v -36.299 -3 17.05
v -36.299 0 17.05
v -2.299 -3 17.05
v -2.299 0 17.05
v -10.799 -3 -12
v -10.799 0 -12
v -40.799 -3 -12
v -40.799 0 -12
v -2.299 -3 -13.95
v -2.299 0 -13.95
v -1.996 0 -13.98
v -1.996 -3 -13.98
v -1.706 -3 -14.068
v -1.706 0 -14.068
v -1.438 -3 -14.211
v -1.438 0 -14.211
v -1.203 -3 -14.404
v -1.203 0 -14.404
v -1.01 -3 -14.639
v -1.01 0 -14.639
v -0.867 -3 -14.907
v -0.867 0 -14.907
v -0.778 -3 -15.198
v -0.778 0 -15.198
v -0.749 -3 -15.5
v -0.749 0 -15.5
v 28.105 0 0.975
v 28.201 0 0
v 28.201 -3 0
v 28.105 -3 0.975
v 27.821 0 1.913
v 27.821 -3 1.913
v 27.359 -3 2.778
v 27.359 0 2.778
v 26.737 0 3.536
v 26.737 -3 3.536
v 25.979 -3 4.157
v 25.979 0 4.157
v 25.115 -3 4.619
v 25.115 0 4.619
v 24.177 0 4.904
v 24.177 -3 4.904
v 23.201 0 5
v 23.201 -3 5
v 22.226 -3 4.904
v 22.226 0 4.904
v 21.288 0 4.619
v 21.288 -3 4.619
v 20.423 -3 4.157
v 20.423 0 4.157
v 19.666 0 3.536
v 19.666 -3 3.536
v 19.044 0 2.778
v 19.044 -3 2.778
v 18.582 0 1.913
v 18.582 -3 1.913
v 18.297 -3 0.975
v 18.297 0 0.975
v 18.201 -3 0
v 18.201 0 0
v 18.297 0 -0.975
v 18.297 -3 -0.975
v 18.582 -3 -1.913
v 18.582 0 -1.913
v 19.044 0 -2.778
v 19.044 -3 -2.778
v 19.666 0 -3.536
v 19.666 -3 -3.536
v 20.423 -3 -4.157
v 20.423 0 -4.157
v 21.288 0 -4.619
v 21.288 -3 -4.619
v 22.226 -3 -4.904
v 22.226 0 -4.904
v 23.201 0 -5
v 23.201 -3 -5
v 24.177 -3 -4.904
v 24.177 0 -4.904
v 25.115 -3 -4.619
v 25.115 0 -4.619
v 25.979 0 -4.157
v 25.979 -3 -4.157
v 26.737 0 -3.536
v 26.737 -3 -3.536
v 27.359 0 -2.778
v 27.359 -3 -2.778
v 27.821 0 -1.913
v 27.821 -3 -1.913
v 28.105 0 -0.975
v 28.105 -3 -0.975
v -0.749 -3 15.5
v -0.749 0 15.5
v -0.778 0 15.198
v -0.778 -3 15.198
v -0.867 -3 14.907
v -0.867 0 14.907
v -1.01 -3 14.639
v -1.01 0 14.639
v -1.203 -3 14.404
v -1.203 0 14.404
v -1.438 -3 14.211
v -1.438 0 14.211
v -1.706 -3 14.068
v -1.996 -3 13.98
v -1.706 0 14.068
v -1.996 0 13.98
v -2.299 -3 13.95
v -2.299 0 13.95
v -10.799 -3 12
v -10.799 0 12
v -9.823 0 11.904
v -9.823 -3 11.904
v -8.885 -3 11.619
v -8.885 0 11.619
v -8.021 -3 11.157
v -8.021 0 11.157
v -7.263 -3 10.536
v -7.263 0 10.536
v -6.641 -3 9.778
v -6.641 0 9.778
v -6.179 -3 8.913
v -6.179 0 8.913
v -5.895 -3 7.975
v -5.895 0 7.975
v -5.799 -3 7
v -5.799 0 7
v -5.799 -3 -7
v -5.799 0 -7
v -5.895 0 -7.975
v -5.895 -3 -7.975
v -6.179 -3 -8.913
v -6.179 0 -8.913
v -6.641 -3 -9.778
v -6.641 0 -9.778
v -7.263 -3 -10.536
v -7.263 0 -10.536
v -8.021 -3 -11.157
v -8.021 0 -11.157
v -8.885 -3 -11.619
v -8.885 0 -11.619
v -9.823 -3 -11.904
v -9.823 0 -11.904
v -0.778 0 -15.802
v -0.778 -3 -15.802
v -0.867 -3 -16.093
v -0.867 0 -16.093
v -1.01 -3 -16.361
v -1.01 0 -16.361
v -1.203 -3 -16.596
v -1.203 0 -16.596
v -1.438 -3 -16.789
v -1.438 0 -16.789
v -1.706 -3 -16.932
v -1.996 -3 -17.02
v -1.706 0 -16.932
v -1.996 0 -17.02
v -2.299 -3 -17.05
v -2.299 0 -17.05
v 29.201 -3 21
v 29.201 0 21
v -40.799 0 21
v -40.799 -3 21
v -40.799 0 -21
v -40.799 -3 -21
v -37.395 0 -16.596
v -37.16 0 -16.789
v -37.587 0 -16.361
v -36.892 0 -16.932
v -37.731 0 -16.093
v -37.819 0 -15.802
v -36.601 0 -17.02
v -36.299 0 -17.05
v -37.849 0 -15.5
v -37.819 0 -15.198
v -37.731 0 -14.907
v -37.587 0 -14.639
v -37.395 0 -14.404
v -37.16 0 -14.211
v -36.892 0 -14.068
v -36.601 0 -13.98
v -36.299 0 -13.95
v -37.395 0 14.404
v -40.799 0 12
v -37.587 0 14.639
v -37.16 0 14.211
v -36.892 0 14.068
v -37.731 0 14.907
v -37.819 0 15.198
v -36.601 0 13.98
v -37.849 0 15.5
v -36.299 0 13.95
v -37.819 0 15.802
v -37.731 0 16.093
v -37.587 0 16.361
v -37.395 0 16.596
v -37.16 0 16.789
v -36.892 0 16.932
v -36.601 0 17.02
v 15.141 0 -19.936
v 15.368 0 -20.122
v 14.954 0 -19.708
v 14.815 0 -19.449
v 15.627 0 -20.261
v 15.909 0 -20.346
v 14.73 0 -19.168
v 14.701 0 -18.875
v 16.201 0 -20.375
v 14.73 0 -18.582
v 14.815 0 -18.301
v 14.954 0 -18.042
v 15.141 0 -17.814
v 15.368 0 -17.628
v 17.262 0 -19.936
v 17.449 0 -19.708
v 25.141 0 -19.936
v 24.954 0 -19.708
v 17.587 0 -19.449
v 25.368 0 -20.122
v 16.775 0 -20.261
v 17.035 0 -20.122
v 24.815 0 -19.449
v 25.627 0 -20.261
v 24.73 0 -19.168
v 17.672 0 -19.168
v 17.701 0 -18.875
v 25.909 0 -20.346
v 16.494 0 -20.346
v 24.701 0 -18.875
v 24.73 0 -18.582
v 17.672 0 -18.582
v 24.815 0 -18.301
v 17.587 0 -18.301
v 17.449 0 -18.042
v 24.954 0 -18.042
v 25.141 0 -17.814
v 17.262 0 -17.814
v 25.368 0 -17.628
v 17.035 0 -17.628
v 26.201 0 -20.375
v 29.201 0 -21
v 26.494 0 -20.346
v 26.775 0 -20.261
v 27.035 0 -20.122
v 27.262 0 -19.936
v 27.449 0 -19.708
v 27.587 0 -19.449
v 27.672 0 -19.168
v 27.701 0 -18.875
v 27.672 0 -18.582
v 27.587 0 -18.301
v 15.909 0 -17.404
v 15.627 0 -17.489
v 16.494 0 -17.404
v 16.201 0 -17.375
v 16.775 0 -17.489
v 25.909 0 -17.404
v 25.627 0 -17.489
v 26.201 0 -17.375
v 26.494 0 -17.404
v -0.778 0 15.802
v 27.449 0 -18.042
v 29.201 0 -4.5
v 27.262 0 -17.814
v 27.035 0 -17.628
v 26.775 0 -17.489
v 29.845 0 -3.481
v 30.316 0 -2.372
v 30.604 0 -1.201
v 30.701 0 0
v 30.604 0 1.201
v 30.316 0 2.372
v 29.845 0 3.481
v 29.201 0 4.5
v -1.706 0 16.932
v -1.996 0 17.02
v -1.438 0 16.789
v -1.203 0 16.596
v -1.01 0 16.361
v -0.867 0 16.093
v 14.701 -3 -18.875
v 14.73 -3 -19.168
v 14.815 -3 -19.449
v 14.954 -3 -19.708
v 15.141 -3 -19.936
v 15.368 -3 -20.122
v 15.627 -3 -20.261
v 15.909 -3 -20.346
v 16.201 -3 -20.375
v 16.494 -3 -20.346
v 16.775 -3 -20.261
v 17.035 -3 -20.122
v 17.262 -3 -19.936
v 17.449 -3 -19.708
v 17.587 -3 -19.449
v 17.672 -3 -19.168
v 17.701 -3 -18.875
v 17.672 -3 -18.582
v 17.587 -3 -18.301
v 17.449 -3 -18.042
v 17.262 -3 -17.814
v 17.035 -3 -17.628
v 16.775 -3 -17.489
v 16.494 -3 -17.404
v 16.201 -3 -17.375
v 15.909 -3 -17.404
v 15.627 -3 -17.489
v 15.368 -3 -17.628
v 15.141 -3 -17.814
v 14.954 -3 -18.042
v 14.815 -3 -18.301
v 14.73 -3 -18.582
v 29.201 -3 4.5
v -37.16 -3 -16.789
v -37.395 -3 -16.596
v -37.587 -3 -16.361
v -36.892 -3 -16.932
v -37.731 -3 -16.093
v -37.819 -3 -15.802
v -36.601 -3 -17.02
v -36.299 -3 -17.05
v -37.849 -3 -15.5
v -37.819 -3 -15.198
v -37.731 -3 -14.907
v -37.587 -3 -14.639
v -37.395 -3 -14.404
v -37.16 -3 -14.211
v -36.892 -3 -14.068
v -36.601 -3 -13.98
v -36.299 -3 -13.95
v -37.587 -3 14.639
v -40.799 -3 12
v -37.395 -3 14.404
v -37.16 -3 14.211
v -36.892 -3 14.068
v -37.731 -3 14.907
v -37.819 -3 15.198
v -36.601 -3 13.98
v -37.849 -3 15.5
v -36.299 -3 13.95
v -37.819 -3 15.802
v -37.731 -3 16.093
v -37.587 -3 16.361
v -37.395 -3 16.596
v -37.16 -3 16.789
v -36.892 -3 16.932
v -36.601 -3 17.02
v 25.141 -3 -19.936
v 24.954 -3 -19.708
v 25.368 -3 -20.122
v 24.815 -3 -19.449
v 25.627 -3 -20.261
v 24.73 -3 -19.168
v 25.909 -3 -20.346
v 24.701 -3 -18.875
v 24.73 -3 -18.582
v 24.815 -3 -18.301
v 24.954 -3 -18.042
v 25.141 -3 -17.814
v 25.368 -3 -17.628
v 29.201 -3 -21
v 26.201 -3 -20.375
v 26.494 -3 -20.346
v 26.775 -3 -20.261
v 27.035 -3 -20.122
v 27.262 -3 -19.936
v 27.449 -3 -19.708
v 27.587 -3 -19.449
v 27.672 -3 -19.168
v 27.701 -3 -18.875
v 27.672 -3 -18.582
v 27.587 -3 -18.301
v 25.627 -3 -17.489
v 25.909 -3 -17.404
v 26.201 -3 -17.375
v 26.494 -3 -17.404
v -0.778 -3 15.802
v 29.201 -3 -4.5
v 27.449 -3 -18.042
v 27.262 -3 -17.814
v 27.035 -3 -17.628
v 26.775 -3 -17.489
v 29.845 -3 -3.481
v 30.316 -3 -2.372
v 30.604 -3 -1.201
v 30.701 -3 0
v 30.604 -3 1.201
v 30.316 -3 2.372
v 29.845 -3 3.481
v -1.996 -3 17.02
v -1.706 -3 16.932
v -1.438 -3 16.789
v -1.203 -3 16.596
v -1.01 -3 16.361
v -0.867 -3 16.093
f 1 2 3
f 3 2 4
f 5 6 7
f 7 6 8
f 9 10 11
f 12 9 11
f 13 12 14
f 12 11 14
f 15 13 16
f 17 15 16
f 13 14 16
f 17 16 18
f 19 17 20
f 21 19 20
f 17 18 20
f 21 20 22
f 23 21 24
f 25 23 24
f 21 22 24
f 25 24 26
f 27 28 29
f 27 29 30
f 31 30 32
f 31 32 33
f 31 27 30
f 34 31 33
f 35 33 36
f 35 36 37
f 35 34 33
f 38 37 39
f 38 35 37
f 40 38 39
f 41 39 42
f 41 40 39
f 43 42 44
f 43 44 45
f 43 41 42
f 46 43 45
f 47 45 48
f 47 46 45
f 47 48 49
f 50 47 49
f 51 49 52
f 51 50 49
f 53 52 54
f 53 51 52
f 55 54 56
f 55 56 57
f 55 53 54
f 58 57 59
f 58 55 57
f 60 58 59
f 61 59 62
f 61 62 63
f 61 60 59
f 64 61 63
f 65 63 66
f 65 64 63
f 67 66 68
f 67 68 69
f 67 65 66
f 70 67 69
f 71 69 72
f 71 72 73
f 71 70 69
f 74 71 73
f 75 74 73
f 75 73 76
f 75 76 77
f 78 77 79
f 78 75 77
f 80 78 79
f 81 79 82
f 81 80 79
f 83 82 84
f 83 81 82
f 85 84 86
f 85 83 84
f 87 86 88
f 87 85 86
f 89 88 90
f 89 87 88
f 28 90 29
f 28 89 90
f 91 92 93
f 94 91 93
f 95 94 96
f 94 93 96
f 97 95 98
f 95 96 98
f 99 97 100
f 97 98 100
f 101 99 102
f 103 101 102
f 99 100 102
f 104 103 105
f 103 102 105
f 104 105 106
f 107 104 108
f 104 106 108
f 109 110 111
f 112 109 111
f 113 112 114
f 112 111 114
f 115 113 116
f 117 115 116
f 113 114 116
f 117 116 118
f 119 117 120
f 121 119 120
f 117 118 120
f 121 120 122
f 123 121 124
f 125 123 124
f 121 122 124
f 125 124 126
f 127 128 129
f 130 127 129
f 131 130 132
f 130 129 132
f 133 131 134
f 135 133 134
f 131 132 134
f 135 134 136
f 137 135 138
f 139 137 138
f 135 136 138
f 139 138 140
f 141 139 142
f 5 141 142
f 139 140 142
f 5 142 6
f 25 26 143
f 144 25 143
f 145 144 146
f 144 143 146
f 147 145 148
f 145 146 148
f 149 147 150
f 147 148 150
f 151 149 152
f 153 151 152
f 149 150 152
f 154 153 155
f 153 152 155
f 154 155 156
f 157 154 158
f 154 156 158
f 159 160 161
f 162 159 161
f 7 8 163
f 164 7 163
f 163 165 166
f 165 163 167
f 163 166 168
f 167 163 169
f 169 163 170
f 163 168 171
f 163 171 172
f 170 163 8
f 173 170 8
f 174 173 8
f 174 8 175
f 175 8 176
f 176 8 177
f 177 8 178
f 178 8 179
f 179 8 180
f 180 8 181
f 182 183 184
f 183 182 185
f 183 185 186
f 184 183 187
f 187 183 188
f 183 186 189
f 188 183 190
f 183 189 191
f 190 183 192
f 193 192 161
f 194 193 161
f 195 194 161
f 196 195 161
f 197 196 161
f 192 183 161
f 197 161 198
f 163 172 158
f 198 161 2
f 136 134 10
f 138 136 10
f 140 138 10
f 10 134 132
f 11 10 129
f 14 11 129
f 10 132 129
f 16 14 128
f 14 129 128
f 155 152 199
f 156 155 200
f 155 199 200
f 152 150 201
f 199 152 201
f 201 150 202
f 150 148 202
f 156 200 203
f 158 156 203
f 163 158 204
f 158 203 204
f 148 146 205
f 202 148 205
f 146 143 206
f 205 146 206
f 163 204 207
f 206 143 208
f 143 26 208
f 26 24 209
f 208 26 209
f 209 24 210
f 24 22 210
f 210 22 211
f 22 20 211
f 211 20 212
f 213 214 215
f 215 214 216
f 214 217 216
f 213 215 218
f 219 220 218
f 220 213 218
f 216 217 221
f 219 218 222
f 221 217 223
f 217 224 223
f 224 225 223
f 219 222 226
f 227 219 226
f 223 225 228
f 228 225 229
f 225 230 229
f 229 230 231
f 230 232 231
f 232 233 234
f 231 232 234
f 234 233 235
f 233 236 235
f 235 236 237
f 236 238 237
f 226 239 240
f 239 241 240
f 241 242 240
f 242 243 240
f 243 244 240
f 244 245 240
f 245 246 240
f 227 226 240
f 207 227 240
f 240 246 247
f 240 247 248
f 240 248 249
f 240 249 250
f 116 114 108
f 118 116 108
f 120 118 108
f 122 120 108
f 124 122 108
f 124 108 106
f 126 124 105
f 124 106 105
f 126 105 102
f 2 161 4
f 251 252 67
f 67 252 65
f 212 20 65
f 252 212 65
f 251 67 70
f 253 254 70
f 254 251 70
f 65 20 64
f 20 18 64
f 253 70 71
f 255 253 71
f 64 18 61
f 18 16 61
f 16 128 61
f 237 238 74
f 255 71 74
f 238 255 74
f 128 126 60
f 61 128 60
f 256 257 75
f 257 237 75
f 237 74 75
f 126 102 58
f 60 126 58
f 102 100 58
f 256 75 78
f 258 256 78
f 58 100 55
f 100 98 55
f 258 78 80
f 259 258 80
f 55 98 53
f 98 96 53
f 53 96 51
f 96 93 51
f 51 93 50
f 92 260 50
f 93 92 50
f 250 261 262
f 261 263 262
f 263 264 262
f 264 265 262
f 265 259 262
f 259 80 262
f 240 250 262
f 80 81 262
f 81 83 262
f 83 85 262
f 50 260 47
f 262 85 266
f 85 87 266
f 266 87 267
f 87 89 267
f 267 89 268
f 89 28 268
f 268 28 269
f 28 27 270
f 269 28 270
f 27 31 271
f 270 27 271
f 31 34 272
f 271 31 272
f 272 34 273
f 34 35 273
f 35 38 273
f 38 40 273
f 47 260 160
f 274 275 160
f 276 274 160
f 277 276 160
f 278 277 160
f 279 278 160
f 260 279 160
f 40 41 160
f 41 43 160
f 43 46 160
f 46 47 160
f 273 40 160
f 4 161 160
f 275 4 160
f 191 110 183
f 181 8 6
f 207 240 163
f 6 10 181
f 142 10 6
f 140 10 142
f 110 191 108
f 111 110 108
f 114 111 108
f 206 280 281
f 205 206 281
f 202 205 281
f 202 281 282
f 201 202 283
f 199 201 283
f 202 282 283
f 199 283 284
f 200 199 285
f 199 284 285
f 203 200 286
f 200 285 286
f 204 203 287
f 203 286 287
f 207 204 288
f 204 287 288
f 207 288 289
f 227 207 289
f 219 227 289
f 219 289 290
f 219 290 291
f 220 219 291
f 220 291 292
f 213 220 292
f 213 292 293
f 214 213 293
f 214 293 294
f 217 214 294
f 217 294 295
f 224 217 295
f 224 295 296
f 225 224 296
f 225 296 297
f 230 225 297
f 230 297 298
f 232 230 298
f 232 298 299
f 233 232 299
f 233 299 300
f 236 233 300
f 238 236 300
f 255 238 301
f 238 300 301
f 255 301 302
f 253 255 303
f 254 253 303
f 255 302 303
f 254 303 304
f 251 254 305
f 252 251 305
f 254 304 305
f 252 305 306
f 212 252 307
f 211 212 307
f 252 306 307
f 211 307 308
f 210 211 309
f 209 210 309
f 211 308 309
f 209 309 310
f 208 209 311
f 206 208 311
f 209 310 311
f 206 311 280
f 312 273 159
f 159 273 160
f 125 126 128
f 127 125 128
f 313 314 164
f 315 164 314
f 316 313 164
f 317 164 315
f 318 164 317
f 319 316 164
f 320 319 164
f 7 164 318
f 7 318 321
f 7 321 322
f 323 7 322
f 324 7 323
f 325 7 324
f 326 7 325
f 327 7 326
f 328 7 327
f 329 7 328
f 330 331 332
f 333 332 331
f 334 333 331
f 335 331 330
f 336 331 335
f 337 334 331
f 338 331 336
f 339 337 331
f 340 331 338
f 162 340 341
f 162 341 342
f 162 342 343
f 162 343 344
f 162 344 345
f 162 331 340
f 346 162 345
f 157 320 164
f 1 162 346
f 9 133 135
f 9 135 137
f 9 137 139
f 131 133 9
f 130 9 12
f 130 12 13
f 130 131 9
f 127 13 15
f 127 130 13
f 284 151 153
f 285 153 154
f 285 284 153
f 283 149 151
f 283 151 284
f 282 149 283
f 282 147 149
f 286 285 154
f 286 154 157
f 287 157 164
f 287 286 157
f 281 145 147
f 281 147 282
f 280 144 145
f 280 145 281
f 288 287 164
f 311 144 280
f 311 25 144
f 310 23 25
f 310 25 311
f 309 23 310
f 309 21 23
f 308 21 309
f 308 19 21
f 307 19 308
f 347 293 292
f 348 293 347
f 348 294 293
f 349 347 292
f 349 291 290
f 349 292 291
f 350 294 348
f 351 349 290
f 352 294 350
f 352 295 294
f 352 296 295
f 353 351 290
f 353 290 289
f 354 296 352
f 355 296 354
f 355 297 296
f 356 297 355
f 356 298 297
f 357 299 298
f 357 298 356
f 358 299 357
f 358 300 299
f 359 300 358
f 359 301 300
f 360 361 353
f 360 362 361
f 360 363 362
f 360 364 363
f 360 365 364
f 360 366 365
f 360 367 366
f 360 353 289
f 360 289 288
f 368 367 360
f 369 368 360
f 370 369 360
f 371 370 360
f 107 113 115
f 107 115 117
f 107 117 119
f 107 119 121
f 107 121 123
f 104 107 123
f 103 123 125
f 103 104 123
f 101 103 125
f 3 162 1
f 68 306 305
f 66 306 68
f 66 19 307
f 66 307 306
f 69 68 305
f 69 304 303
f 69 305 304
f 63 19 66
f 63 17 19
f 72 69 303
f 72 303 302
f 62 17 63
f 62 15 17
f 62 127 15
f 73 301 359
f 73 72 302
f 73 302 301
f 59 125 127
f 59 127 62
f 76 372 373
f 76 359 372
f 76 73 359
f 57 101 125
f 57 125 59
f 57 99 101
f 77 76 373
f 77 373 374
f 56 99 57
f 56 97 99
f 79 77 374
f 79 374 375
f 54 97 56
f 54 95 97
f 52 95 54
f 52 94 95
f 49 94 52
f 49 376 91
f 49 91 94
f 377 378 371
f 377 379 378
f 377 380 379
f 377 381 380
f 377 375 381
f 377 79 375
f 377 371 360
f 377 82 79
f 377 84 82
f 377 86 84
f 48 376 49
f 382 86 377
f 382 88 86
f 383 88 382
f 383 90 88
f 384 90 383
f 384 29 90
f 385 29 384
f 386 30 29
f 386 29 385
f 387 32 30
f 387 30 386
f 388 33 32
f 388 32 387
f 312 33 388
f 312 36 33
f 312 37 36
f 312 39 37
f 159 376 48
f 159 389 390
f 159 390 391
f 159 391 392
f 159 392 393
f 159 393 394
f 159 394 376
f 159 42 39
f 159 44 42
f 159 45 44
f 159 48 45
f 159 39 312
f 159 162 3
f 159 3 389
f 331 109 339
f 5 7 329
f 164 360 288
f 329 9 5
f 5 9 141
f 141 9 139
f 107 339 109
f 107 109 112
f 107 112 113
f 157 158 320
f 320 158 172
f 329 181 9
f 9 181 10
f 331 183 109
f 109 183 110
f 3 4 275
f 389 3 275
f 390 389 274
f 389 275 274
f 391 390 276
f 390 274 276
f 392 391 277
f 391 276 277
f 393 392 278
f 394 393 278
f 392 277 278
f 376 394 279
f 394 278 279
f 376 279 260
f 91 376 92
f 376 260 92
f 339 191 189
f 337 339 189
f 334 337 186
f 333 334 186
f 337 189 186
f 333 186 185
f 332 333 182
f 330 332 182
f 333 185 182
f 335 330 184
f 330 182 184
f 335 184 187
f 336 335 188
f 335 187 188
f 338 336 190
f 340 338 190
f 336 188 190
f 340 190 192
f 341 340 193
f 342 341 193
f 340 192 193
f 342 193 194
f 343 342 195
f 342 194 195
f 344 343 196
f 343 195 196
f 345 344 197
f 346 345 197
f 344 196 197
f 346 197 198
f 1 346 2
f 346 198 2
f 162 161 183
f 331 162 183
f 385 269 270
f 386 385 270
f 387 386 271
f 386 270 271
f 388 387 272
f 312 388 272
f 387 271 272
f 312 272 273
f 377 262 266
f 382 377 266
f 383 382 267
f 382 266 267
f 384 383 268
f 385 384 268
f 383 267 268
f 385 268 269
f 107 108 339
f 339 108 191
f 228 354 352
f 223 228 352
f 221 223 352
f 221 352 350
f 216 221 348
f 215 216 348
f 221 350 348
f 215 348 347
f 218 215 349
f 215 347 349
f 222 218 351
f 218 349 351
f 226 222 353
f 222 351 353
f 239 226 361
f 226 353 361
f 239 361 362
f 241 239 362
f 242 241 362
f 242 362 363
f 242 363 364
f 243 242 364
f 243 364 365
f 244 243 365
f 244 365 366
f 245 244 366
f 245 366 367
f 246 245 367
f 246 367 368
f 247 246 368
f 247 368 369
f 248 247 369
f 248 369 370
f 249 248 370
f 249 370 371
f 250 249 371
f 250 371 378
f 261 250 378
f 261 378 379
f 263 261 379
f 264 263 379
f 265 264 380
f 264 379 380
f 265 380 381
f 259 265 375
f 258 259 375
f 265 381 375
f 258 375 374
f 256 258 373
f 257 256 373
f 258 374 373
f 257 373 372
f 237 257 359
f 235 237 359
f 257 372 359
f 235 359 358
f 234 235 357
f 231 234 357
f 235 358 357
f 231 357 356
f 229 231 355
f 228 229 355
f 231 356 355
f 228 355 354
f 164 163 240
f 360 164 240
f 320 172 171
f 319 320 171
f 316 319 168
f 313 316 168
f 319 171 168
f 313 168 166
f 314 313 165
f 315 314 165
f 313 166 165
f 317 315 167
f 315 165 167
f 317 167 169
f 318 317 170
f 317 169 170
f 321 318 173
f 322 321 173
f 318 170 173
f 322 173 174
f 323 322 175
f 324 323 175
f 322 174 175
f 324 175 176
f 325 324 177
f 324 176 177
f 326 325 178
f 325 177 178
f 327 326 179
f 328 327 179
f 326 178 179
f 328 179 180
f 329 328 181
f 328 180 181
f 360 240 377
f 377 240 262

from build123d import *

# Parameters (mm, degrees)
F0_R     = 5
F1_DEPTH = 3
F2_D     = 3


with BuildPart() as f1:
    # F0 (on Front) → F1 (new body)
    with BuildSketch(Plane.XZ):
        with BuildLine():
            Line((29.2013126835, 21), (-40.7986873165, 21))
            Line((-40.7986873165, 21), (-40.7986873165, 12))
            Line((-40.7986873165, 12), (-10.7986873165, 12))
            ThreePointArc((-10.7986873165, 12), (-7.2631534106, 10.5355339059), (-5.7986873165, 7))
            Line((-5.7986873165, 7), (-5.7986873165, -7))
            ThreePointArc((-5.7986873165, -7), (-7.2631534106, -10.5355339059), (-10.7986873165, -12))
            Line((-10.7986873165, -12), (-40.7986873165, -12))
            Line((-40.7986873165, -12), (-40.7986873165, -21))
            Line((-40.7986873165, -21), (29.2013126835, -21))
            Line((29.2013126835, -21), (29.2013126835, -4.5))
            ThreePointArc((29.2013126835, -4.5), (15.7013126835, 0), (29.2013126835, 4.5))
            Line((29.2013126835, 4.5), (29.2013126835, 21))
        make_face()
        with BuildLine():
            Line((-2.2986873165, -17.05), (-36.2986873165, -17.05))
            ThreePointArc((-36.2986873165, -17.05), (-37.8486873165, -15.5), (-36.2986873165, -13.95))
            Line((-36.2986873165, -13.95), (-2.2986873165, -13.95))
            ThreePointArc((-2.2986873165, -13.95), (-1.2026718057, -14.4039844892), (-0.7486873165, -15.5))
            ThreePointArc((-0.7486873165, -15.5), (-1.2026718057, -16.5960155108), (-2.2986873165, -17.05))
        make_face(mode=Mode.SUBTRACT)
        with BuildLine():
            ThreePointArc((-36.2986873165, 13.95), (-37.8486873165, 15.5), (-36.2986873165, 17.05))
            Line((-36.2986873165, 17.05), (-2.2986873165, 17.05))
            ThreePointArc((-2.2986873165, 17.05), (-1.2026718057, 16.5960155108), (-0.7486873165, 15.5))
            ThreePointArc((-0.7486873165, 15.5), (-1.2026718057, 14.4039844892), (-2.2986873165, 13.95))
            Line((-2.2986873165, 13.95), (-36.2986873165, 13.95))
        make_face(mode=Mode.SUBTRACT)
        with BuildLine():
            ThreePointArc((30.7013126835, 0), (30.3164374189, 2.3717082451), (29.2013126835, 4.5))
            Line((29.2013126835, 4.5), (29.2013126835, -4.5))
            ThreePointArc((29.2013126835, -4.5), (30.3164374189, -2.3717082451), (30.7013126835, 0))
        make_face()
        with BuildLine():
            Line((29.2013126835, -4.5), (29.2013126835, 4.5))
            ThreePointArc((29.2013126835, 4.5), (15.7013126835, 0), (29.2013126835, -4.5))
        make_face()
        with Locations((23.2013126835, 0)):
            Circle(F0_R, mode=Mode.SUBTRACT)
    extrude(amount=F1_DEPTH)

    # F2 (through all)
    with Locations(Plane(origin=(0, 0, 0), x_dir=(1, 0, 0), z_dir=(0, 1, 0))):
        with Locations((16.2013126835, 18.875), (26.2013126835, 18.875)):
            Hole(F2_D / 2)


solid = f1.part
